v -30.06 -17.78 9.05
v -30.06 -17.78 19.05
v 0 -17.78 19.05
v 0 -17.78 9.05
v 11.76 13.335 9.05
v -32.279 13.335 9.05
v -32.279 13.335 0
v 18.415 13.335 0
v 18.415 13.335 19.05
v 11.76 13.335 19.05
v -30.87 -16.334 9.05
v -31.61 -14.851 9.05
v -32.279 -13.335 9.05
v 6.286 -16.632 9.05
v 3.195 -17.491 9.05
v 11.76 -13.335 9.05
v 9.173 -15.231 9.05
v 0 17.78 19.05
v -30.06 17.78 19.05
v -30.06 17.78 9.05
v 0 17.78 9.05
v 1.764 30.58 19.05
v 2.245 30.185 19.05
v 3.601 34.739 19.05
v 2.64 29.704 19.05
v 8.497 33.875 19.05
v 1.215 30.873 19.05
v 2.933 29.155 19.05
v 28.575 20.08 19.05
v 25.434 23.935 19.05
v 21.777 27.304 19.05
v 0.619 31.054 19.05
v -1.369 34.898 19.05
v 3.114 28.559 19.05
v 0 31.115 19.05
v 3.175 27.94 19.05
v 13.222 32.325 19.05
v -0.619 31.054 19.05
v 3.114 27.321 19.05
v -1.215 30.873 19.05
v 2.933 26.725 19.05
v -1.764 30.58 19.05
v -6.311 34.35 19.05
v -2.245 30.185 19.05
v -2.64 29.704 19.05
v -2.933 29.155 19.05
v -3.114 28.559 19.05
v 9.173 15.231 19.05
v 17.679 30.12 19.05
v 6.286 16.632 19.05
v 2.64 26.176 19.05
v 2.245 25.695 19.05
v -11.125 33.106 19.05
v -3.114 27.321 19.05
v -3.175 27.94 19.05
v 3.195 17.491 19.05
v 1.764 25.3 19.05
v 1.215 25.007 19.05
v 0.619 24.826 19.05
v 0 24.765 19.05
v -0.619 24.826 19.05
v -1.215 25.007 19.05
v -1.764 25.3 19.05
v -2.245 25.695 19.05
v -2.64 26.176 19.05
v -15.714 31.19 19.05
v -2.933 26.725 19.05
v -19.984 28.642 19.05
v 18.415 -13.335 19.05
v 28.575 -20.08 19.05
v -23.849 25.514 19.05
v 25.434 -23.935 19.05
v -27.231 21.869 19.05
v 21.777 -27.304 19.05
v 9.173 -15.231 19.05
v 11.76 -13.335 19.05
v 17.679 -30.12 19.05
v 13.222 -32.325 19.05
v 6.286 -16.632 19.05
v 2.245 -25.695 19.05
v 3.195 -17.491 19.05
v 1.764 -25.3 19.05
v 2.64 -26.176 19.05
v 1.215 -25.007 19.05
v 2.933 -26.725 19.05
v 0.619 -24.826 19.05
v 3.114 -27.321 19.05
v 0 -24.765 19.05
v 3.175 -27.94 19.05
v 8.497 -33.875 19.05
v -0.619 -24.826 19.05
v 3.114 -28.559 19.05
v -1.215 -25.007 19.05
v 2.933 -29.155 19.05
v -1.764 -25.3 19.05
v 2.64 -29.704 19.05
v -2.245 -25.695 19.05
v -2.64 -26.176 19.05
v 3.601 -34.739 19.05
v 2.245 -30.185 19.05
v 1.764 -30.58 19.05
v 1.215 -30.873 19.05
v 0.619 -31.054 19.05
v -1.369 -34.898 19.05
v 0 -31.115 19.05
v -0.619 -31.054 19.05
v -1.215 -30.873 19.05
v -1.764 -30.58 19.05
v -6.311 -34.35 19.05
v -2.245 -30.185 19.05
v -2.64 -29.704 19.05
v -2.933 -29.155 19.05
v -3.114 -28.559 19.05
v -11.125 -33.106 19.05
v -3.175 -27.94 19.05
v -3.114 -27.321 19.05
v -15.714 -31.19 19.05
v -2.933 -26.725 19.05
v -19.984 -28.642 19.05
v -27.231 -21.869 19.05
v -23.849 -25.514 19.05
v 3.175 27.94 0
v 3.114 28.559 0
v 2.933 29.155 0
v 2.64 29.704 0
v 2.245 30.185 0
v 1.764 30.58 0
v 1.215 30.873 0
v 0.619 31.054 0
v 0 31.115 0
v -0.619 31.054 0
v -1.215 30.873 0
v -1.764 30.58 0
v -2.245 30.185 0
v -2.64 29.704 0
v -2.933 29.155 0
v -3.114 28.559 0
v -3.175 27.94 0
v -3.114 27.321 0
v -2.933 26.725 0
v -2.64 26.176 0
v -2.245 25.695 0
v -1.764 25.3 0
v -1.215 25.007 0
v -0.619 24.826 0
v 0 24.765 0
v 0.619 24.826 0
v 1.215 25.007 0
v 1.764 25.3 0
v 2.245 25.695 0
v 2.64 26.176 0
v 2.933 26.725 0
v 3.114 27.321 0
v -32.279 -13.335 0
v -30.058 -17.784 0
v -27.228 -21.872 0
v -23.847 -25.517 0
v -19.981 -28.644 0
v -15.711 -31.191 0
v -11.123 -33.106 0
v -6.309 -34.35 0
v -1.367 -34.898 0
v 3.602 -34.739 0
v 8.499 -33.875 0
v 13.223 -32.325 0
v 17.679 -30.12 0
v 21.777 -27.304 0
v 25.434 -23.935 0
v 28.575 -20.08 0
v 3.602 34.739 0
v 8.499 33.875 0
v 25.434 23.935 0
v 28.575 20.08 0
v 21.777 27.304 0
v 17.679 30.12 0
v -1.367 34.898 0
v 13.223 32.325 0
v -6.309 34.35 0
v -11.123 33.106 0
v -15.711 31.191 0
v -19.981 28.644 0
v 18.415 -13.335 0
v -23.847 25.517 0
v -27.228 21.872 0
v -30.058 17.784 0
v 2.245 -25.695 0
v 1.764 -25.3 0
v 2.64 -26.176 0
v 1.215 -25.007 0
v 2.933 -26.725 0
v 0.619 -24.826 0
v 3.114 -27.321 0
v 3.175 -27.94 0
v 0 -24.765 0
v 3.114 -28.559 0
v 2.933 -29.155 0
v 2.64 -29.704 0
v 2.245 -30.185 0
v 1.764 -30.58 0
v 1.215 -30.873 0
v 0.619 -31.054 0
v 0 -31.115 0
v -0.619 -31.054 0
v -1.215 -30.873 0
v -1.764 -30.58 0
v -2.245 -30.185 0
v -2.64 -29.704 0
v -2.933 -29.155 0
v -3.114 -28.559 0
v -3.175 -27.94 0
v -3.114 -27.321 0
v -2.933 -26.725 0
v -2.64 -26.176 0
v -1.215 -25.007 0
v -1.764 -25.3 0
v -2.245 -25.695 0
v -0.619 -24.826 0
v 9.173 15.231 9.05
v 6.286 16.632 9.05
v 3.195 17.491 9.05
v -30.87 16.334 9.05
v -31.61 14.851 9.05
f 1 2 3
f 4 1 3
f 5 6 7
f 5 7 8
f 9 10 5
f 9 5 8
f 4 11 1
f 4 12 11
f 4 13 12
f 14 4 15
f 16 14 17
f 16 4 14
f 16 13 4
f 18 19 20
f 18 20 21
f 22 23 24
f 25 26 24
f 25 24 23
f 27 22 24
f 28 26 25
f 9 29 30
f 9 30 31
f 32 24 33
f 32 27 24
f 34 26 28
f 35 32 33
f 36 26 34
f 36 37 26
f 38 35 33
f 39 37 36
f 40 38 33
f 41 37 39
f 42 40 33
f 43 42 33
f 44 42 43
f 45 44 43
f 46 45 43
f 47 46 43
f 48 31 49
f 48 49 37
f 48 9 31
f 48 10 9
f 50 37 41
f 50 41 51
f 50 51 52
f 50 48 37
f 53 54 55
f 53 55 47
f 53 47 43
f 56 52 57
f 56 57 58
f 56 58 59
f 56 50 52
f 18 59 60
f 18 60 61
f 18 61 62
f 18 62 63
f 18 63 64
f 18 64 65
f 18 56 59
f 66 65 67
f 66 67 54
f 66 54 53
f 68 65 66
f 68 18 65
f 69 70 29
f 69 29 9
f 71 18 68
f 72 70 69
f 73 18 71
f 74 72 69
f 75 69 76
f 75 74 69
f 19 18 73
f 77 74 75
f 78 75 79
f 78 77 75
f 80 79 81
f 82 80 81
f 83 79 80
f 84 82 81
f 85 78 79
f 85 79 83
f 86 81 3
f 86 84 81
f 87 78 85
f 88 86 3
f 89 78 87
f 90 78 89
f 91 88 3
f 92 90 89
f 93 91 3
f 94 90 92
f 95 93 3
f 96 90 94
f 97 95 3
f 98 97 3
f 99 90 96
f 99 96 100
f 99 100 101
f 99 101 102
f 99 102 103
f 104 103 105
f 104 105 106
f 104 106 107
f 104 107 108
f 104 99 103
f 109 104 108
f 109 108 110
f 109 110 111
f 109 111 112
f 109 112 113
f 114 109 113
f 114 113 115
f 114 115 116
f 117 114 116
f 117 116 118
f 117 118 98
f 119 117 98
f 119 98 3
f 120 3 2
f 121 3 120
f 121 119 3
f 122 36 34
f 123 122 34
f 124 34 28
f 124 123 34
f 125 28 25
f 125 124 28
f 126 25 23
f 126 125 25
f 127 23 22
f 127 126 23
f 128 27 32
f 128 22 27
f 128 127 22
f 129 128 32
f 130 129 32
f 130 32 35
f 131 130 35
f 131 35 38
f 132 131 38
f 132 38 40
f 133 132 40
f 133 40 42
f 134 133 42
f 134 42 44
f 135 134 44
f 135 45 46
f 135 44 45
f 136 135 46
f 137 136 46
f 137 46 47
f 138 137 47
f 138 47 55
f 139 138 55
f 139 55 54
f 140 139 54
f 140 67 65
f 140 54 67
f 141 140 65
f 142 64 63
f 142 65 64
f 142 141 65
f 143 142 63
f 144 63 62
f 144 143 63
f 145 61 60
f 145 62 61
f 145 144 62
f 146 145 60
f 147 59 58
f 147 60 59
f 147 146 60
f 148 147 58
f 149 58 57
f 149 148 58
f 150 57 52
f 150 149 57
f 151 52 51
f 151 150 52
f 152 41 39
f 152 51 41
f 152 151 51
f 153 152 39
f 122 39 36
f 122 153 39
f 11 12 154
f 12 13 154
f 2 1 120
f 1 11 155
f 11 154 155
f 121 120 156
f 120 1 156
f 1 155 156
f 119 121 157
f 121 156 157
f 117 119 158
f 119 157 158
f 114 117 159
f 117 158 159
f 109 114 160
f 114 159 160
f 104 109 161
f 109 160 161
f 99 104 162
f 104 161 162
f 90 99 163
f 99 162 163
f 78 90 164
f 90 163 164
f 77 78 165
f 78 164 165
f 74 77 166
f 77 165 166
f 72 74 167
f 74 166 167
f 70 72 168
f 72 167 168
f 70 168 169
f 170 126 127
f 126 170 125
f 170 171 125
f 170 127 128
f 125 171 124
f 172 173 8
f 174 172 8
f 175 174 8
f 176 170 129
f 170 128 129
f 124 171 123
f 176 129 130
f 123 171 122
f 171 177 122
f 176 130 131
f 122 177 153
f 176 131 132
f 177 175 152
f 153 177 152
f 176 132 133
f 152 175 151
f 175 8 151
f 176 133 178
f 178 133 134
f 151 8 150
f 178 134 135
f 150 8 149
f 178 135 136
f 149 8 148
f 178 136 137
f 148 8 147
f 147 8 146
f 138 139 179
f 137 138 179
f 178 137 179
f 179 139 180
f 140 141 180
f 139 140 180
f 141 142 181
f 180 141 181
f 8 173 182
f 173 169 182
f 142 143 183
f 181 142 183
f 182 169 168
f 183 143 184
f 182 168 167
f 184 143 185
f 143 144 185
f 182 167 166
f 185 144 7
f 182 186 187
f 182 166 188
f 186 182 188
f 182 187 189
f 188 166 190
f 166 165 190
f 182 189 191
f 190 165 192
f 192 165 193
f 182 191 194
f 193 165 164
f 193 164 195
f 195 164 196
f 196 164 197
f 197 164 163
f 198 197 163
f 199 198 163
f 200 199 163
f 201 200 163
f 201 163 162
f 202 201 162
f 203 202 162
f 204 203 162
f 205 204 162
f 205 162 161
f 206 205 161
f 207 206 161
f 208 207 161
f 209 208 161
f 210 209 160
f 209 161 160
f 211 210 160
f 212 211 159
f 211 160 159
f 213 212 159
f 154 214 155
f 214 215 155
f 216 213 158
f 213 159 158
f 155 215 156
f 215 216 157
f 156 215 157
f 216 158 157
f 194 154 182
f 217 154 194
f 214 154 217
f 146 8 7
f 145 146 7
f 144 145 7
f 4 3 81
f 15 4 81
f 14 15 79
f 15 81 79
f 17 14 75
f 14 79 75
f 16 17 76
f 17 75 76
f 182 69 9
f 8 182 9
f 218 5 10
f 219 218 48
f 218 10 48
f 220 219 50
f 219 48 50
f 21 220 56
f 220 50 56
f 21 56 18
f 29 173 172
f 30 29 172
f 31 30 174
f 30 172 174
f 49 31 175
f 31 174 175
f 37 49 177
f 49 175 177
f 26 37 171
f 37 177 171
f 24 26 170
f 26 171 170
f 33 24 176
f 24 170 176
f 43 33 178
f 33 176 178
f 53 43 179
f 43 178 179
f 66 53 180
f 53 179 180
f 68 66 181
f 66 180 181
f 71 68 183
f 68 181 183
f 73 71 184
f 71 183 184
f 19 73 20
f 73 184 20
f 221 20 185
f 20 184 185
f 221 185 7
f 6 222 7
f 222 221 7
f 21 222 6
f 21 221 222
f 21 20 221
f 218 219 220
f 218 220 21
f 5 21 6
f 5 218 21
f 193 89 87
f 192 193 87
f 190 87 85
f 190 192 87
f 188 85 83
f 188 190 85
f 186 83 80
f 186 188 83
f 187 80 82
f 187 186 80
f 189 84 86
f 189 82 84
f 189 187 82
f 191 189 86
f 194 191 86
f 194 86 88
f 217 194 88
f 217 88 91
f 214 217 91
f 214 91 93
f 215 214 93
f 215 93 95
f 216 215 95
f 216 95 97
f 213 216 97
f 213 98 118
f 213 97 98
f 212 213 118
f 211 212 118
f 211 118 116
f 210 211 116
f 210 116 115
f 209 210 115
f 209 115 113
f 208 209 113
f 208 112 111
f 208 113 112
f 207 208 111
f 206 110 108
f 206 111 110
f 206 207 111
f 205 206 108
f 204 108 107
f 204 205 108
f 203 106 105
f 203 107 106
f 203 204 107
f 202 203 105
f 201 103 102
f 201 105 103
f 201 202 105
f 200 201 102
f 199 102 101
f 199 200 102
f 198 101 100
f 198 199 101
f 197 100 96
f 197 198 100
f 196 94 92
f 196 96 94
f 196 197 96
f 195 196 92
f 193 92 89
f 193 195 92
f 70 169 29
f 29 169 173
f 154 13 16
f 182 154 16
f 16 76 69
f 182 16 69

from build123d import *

# Parameters (mm, degrees)
SKETCH1_R               = 34.925
BOSS_EXTRUDE1_DEPTH     = 19.05
SKETCH2_W               = 106.68
SKETCH2_H               = 26.67
CUT_EXTRUDE1_DEPTH      = 19.05
SKETCH4_W               = 76.2
SKETCH4_H               = 35.56
CUT_EXTRUDE2_DEPTH      = 10
SKETCH5_R               = 17.78
CUT_EXTRUDE3_DEPTH      = 10
CUT_EXTRUDE4_DEPTH      = 53.937829102
CUT_EXTRUDE4_DEPTH_BACK = 53.937829102
SKETCH6_R               = 3.175
CUT_EXTRUDE5_DEPTH      = 53.937829102
CUT_EXTRUDE5_DEPTH_BACK = 53.937829102
SKETCH7_W               = 12.7
SKETCH7_H               = 106.569119896


with BuildPart() as part:
    # Sketch1 → Boss-Extrude1 (new body)
    with BuildSketch(Plane.XY):
        with Locations(Location((0, 0, 0), (0, 0, 180))):
            Circle(SKETCH1_R)
    extrude(amount=BOSS_EXTRUDE1_DEPTH)

    # Sketch2 → Cut-Extrude1 (cut)
    with BuildSketch(Plane.XY.offset(19.05)):
        with Locations((-34.925, 0)):
            Rectangle(SKETCH2_W, SKETCH2_H)
    extrude(amount=-CUT_EXTRUDE1_DEPTH, mode=Mode.SUBTRACT)

    # Sketch4 → Cut-Extrude2 (cut)
    with BuildSketch(Plane.XY.offset(19.05)):
        with Locations((-38.1, 0)):
            Rectangle(SKETCH4_W, SKETCH4_H)
    extrude(amount=-CUT_EXTRUDE2_DEPTH, mode=Mode.SUBTRACT)

    # Sketch5 → Cut-Extrude3 (cut)
    with BuildSketch(Plane.XY.offset(19.05)):
        Circle(SKETCH5_R)
    extrude(amount=-CUT_EXTRUDE3_DEPTH, mode=Mode.SUBTRACT)

    # Sketch6 → Cut-Extrude4 (cut, two sides: drawn at the far end of the back side and taken through both)
    with BuildSketch(Plane.XY.offset(19.05).offset(-CUT_EXTRUDE4_DEPTH_BACK)):
        with Locations((0, 27.94)):
            Circle(SKETCH6_R)
        with Locations((0, -27.94)):
            Circle(SKETCH6_R)
    extrude(amount=CUT_EXTRUDE4_DEPTH + CUT_EXTRUDE4_DEPTH_BACK, mode=Mode.SUBTRACT)

    # Sketch7 → Cut-Extrude5 (cut, two sides: drawn at the far end of the back side and taken through both)
    with BuildSketch(Plane.XY.offset(19.05).offset(-CUT_EXTRUDE5_DEPTH_BACK)):
        with Locations((34.925, 0)):
            Rectangle(SKETCH7_W, SKETCH7_H)
    extrude(amount=CUT_EXTRUDE5_DEPTH + CUT_EXTRUDE5_DEPTH_BACK, mode=Mode.SUBTRACT)


solid = part.part
